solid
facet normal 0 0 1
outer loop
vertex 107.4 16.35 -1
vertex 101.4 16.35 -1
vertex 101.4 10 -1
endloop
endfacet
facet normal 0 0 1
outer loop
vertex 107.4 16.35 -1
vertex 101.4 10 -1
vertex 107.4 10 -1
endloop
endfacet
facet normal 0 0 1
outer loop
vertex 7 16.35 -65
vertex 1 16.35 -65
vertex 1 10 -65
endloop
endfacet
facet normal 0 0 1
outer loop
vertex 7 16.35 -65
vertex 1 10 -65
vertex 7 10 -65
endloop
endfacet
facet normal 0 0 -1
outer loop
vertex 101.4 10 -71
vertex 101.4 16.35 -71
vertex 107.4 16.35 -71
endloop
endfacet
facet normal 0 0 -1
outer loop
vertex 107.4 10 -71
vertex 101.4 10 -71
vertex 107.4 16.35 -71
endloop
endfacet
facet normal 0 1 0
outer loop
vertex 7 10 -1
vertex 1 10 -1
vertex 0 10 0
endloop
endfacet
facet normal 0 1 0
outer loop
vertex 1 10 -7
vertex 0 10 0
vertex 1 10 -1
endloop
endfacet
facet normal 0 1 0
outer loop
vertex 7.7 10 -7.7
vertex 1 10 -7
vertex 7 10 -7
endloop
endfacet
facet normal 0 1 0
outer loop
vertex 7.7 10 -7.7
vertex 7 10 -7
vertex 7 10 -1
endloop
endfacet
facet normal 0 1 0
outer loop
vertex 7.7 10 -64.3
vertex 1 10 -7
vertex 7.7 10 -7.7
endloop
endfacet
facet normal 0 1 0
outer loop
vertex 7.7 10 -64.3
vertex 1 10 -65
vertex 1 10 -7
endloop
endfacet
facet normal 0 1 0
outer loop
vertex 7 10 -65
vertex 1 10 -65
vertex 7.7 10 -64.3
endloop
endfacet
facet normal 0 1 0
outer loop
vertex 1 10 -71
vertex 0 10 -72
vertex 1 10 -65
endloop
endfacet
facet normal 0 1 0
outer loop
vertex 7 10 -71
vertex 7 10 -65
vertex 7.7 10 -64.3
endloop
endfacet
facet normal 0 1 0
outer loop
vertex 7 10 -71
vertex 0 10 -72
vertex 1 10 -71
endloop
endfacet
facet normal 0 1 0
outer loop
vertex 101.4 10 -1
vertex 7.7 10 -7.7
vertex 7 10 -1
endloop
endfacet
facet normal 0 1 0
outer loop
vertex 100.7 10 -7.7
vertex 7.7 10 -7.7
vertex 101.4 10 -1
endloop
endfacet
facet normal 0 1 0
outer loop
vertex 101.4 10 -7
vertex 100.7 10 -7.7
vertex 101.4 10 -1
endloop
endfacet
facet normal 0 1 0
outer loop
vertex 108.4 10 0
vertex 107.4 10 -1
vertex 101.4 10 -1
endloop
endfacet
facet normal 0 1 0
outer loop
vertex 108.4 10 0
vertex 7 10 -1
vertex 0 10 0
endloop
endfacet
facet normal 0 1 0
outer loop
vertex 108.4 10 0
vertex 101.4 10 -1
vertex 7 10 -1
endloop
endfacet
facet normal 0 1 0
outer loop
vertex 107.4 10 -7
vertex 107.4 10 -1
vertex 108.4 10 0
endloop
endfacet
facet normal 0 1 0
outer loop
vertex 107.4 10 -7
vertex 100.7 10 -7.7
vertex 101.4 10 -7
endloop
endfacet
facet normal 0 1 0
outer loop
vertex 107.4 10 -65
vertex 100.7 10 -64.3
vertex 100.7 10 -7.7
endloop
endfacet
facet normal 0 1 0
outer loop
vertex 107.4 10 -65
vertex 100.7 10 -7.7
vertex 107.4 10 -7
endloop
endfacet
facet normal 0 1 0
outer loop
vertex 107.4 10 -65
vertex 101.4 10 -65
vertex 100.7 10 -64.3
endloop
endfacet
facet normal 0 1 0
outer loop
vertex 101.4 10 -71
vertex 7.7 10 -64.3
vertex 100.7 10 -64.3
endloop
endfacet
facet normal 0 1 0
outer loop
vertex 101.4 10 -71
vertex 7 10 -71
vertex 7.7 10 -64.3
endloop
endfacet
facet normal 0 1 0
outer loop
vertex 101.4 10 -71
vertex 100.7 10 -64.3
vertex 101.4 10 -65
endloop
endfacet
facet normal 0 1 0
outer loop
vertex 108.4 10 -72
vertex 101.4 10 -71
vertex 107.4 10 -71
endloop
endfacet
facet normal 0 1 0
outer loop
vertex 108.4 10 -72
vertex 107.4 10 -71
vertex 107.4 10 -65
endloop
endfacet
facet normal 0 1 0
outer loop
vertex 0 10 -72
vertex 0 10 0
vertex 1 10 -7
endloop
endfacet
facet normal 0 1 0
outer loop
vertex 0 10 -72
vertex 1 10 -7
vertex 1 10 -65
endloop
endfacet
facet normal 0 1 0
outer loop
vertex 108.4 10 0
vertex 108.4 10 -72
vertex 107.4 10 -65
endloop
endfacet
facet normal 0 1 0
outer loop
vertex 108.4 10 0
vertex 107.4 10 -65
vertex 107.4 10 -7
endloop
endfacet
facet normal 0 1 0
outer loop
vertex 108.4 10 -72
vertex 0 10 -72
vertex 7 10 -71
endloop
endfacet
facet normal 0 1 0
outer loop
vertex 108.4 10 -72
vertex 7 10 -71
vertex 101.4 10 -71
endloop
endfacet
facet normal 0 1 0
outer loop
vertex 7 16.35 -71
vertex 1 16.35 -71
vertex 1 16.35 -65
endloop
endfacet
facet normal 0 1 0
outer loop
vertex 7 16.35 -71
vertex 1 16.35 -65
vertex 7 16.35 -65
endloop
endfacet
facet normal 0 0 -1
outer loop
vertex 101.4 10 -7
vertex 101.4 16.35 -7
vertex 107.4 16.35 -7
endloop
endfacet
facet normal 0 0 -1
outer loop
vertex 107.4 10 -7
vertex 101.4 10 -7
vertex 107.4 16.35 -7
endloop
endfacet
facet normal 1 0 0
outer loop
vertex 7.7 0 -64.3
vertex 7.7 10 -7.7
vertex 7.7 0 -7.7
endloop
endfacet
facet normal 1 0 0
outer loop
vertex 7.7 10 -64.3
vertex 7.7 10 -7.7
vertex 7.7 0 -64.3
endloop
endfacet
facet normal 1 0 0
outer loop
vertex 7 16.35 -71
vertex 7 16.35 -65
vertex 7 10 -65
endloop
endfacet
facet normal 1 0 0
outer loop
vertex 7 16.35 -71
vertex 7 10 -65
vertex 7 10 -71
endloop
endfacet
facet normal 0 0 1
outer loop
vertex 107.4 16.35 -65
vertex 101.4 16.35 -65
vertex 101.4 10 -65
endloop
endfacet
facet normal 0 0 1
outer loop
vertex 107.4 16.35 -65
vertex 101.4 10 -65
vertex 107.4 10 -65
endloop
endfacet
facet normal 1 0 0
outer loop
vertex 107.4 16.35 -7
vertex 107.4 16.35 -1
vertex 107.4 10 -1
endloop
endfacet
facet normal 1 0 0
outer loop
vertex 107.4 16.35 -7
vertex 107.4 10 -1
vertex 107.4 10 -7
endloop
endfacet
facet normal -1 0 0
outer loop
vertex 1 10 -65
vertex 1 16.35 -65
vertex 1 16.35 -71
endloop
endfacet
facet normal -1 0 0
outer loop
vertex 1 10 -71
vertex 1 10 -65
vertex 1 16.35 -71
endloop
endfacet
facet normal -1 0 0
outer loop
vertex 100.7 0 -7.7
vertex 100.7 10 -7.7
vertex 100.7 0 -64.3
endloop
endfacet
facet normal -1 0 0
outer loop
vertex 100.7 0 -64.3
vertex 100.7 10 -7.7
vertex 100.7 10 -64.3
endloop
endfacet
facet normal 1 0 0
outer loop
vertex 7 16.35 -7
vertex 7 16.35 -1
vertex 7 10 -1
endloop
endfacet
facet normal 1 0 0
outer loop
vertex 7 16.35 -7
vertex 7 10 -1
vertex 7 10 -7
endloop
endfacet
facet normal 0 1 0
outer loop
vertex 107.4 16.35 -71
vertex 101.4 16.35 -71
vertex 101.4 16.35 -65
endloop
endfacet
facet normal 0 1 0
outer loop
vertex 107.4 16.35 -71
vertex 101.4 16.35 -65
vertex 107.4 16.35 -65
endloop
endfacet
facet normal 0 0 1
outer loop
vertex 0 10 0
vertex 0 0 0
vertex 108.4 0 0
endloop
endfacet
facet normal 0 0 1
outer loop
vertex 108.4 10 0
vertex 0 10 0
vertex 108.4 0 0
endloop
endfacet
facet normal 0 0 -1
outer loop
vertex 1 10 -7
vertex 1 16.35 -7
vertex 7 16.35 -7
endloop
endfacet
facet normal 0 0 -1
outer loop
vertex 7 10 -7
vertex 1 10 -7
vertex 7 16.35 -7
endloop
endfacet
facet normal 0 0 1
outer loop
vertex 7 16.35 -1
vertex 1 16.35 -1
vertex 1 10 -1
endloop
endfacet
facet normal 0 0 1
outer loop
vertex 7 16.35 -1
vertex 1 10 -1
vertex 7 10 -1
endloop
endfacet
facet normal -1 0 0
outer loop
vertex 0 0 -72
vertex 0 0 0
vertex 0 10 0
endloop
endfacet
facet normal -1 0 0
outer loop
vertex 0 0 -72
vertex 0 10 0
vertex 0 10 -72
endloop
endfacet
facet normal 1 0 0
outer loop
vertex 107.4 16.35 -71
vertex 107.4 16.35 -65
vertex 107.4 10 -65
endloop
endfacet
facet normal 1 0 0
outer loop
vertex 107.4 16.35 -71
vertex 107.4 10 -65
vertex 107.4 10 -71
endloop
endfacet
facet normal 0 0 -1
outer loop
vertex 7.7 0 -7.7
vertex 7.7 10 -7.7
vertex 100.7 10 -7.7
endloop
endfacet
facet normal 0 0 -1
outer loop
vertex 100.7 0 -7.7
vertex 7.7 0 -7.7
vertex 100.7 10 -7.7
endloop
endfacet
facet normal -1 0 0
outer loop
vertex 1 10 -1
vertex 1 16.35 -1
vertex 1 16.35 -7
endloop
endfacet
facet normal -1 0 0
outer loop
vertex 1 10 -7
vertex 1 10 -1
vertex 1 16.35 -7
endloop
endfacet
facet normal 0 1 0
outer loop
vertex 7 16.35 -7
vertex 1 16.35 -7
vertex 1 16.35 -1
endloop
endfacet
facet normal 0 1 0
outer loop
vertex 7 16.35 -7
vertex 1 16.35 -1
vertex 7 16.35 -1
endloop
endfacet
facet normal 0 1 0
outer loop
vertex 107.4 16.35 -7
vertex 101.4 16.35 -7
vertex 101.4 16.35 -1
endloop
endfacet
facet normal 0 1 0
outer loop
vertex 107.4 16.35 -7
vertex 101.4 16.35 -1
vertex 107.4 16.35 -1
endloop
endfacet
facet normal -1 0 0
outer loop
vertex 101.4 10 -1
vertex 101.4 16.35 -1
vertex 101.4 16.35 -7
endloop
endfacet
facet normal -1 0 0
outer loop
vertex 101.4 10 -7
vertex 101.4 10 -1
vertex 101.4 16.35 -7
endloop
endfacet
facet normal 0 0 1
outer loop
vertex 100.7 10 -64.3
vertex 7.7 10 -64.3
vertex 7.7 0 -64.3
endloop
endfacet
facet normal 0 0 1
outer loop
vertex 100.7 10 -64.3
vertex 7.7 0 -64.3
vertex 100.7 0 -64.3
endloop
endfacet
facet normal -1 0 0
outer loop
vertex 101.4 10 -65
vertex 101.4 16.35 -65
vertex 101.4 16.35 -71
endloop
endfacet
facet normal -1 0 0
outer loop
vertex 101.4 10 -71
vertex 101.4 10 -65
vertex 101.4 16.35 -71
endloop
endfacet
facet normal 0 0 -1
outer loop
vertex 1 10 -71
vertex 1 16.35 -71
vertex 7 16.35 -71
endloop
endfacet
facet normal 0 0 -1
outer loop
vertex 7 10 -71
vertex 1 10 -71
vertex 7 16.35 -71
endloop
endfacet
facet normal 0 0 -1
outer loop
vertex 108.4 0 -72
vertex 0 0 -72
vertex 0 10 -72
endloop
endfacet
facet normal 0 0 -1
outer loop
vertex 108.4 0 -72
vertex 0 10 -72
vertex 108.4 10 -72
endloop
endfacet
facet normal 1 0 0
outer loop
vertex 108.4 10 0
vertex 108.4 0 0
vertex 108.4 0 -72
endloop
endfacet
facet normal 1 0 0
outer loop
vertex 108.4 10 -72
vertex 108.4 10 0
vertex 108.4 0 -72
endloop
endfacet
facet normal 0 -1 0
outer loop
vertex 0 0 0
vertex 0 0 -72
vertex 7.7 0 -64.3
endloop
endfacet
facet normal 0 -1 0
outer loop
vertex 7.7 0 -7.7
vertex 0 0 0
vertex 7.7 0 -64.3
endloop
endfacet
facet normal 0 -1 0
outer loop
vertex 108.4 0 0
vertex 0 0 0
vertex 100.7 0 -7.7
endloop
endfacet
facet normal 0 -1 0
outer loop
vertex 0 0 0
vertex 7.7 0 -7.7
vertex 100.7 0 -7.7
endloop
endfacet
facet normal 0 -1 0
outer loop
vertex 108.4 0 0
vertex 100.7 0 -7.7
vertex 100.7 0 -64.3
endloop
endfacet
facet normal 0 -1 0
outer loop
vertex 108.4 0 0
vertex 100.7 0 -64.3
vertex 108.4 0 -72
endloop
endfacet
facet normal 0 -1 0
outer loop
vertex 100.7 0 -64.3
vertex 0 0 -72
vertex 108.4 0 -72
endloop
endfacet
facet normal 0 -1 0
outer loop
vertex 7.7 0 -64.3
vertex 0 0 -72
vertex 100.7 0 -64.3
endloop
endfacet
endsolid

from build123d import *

# Parameters (mm, degrees)
SKETCH1_W           = 108.4
SKETCH1_H           = 72
BOSS_EXTRUDE1_DEPTH = 10
SKETCH2_W           = 93
SKETCH2_H           = 56.6
CUT_EXTRUDE1_DEPTH  = 131.516512365
SKETCH4_W           = 6
SKETCH4_H           = 6
BOSS_EXTRUDE2_DEPTH = 6.35
SKETCH5_W           = 6
SKETCH5_H           = 6
BOSS_EXTRUDE3_DEPTH = 6.35
SKETCH6_W           = 6
SKETCH6_H           = 6
BOSS_EXTRUDE4_DEPTH = 6.35
SKETCH7_W           = 6
SKETCH7_H           = 6
BOSS_EXTRUDE5_DEPTH = 6.35


with BuildPart() as part:
    # Sketch1 → Boss-Extrude1 (new body)
    with BuildSketch(Plane(origin=(0, 0, 0), x_dir=(1, 0, 0), z_dir=(0, 1, 0))):
        with Locations((54.2, 36)):
            Rectangle(SKETCH1_W, SKETCH1_H)
    extrude(amount=BOSS_EXTRUDE1_DEPTH)

    # Sketch2 → Cut-Extrude1 (cut, through all)
    with BuildSketch(Plane(origin=(0, 10, 0), x_dir=(1, 0, 0), z_dir=(0, 1, 0))):
        with Locations((54.2, 36)):
            Rectangle(SKETCH2_W, SKETCH2_H)
    extrude(amount=-CUT_EXTRUDE1_DEPTH, mode=Mode.SUBTRACT)

    # Sketch4 → Boss-Extrude2 (add)
    with BuildSketch(Plane(origin=(0, 10, 0), x_dir=(1, 0, 0), z_dir=(0, 1, 0))):
        with Locations((4, 4)):
            Rectangle(SKETCH4_W, SKETCH4_H)
    extrude(amount=BOSS_EXTRUDE2_DEPTH)

    # Sketch5 → Boss-Extrude3 (add)
    with BuildSketch(Plane(origin=(0, 10, 0), x_dir=(1, 0, 0), z_dir=(0, 1, 0))):
        with Locations((104.4, 4)):
            Rectangle(SKETCH5_W, SKETCH5_H)
    extrude(amount=BOSS_EXTRUDE3_DEPTH)

    # Sketch6 → Boss-Extrude4 (add)
    with BuildSketch(Plane(origin=(0, 10, 0), x_dir=(1, 0, 0), z_dir=(0, 1, 0))):
        with Locations((4, 68)):
            Rectangle(SKETCH6_W, SKETCH6_H)
    extrude(amount=BOSS_EXTRUDE4_DEPTH)

    # Sketch7 → Boss-Extrude5 (add)
    with BuildSketch(Plane(origin=(0, 10, 0), x_dir=(1, 0, 0), z_dir=(0, 1, 0))):
        with Locations((104.4, 68)):
            Rectangle(SKETCH7_W, SKETCH7_H)
    extrude(amount=BOSS_EXTRUDE5_DEPTH)


solid = part.part
